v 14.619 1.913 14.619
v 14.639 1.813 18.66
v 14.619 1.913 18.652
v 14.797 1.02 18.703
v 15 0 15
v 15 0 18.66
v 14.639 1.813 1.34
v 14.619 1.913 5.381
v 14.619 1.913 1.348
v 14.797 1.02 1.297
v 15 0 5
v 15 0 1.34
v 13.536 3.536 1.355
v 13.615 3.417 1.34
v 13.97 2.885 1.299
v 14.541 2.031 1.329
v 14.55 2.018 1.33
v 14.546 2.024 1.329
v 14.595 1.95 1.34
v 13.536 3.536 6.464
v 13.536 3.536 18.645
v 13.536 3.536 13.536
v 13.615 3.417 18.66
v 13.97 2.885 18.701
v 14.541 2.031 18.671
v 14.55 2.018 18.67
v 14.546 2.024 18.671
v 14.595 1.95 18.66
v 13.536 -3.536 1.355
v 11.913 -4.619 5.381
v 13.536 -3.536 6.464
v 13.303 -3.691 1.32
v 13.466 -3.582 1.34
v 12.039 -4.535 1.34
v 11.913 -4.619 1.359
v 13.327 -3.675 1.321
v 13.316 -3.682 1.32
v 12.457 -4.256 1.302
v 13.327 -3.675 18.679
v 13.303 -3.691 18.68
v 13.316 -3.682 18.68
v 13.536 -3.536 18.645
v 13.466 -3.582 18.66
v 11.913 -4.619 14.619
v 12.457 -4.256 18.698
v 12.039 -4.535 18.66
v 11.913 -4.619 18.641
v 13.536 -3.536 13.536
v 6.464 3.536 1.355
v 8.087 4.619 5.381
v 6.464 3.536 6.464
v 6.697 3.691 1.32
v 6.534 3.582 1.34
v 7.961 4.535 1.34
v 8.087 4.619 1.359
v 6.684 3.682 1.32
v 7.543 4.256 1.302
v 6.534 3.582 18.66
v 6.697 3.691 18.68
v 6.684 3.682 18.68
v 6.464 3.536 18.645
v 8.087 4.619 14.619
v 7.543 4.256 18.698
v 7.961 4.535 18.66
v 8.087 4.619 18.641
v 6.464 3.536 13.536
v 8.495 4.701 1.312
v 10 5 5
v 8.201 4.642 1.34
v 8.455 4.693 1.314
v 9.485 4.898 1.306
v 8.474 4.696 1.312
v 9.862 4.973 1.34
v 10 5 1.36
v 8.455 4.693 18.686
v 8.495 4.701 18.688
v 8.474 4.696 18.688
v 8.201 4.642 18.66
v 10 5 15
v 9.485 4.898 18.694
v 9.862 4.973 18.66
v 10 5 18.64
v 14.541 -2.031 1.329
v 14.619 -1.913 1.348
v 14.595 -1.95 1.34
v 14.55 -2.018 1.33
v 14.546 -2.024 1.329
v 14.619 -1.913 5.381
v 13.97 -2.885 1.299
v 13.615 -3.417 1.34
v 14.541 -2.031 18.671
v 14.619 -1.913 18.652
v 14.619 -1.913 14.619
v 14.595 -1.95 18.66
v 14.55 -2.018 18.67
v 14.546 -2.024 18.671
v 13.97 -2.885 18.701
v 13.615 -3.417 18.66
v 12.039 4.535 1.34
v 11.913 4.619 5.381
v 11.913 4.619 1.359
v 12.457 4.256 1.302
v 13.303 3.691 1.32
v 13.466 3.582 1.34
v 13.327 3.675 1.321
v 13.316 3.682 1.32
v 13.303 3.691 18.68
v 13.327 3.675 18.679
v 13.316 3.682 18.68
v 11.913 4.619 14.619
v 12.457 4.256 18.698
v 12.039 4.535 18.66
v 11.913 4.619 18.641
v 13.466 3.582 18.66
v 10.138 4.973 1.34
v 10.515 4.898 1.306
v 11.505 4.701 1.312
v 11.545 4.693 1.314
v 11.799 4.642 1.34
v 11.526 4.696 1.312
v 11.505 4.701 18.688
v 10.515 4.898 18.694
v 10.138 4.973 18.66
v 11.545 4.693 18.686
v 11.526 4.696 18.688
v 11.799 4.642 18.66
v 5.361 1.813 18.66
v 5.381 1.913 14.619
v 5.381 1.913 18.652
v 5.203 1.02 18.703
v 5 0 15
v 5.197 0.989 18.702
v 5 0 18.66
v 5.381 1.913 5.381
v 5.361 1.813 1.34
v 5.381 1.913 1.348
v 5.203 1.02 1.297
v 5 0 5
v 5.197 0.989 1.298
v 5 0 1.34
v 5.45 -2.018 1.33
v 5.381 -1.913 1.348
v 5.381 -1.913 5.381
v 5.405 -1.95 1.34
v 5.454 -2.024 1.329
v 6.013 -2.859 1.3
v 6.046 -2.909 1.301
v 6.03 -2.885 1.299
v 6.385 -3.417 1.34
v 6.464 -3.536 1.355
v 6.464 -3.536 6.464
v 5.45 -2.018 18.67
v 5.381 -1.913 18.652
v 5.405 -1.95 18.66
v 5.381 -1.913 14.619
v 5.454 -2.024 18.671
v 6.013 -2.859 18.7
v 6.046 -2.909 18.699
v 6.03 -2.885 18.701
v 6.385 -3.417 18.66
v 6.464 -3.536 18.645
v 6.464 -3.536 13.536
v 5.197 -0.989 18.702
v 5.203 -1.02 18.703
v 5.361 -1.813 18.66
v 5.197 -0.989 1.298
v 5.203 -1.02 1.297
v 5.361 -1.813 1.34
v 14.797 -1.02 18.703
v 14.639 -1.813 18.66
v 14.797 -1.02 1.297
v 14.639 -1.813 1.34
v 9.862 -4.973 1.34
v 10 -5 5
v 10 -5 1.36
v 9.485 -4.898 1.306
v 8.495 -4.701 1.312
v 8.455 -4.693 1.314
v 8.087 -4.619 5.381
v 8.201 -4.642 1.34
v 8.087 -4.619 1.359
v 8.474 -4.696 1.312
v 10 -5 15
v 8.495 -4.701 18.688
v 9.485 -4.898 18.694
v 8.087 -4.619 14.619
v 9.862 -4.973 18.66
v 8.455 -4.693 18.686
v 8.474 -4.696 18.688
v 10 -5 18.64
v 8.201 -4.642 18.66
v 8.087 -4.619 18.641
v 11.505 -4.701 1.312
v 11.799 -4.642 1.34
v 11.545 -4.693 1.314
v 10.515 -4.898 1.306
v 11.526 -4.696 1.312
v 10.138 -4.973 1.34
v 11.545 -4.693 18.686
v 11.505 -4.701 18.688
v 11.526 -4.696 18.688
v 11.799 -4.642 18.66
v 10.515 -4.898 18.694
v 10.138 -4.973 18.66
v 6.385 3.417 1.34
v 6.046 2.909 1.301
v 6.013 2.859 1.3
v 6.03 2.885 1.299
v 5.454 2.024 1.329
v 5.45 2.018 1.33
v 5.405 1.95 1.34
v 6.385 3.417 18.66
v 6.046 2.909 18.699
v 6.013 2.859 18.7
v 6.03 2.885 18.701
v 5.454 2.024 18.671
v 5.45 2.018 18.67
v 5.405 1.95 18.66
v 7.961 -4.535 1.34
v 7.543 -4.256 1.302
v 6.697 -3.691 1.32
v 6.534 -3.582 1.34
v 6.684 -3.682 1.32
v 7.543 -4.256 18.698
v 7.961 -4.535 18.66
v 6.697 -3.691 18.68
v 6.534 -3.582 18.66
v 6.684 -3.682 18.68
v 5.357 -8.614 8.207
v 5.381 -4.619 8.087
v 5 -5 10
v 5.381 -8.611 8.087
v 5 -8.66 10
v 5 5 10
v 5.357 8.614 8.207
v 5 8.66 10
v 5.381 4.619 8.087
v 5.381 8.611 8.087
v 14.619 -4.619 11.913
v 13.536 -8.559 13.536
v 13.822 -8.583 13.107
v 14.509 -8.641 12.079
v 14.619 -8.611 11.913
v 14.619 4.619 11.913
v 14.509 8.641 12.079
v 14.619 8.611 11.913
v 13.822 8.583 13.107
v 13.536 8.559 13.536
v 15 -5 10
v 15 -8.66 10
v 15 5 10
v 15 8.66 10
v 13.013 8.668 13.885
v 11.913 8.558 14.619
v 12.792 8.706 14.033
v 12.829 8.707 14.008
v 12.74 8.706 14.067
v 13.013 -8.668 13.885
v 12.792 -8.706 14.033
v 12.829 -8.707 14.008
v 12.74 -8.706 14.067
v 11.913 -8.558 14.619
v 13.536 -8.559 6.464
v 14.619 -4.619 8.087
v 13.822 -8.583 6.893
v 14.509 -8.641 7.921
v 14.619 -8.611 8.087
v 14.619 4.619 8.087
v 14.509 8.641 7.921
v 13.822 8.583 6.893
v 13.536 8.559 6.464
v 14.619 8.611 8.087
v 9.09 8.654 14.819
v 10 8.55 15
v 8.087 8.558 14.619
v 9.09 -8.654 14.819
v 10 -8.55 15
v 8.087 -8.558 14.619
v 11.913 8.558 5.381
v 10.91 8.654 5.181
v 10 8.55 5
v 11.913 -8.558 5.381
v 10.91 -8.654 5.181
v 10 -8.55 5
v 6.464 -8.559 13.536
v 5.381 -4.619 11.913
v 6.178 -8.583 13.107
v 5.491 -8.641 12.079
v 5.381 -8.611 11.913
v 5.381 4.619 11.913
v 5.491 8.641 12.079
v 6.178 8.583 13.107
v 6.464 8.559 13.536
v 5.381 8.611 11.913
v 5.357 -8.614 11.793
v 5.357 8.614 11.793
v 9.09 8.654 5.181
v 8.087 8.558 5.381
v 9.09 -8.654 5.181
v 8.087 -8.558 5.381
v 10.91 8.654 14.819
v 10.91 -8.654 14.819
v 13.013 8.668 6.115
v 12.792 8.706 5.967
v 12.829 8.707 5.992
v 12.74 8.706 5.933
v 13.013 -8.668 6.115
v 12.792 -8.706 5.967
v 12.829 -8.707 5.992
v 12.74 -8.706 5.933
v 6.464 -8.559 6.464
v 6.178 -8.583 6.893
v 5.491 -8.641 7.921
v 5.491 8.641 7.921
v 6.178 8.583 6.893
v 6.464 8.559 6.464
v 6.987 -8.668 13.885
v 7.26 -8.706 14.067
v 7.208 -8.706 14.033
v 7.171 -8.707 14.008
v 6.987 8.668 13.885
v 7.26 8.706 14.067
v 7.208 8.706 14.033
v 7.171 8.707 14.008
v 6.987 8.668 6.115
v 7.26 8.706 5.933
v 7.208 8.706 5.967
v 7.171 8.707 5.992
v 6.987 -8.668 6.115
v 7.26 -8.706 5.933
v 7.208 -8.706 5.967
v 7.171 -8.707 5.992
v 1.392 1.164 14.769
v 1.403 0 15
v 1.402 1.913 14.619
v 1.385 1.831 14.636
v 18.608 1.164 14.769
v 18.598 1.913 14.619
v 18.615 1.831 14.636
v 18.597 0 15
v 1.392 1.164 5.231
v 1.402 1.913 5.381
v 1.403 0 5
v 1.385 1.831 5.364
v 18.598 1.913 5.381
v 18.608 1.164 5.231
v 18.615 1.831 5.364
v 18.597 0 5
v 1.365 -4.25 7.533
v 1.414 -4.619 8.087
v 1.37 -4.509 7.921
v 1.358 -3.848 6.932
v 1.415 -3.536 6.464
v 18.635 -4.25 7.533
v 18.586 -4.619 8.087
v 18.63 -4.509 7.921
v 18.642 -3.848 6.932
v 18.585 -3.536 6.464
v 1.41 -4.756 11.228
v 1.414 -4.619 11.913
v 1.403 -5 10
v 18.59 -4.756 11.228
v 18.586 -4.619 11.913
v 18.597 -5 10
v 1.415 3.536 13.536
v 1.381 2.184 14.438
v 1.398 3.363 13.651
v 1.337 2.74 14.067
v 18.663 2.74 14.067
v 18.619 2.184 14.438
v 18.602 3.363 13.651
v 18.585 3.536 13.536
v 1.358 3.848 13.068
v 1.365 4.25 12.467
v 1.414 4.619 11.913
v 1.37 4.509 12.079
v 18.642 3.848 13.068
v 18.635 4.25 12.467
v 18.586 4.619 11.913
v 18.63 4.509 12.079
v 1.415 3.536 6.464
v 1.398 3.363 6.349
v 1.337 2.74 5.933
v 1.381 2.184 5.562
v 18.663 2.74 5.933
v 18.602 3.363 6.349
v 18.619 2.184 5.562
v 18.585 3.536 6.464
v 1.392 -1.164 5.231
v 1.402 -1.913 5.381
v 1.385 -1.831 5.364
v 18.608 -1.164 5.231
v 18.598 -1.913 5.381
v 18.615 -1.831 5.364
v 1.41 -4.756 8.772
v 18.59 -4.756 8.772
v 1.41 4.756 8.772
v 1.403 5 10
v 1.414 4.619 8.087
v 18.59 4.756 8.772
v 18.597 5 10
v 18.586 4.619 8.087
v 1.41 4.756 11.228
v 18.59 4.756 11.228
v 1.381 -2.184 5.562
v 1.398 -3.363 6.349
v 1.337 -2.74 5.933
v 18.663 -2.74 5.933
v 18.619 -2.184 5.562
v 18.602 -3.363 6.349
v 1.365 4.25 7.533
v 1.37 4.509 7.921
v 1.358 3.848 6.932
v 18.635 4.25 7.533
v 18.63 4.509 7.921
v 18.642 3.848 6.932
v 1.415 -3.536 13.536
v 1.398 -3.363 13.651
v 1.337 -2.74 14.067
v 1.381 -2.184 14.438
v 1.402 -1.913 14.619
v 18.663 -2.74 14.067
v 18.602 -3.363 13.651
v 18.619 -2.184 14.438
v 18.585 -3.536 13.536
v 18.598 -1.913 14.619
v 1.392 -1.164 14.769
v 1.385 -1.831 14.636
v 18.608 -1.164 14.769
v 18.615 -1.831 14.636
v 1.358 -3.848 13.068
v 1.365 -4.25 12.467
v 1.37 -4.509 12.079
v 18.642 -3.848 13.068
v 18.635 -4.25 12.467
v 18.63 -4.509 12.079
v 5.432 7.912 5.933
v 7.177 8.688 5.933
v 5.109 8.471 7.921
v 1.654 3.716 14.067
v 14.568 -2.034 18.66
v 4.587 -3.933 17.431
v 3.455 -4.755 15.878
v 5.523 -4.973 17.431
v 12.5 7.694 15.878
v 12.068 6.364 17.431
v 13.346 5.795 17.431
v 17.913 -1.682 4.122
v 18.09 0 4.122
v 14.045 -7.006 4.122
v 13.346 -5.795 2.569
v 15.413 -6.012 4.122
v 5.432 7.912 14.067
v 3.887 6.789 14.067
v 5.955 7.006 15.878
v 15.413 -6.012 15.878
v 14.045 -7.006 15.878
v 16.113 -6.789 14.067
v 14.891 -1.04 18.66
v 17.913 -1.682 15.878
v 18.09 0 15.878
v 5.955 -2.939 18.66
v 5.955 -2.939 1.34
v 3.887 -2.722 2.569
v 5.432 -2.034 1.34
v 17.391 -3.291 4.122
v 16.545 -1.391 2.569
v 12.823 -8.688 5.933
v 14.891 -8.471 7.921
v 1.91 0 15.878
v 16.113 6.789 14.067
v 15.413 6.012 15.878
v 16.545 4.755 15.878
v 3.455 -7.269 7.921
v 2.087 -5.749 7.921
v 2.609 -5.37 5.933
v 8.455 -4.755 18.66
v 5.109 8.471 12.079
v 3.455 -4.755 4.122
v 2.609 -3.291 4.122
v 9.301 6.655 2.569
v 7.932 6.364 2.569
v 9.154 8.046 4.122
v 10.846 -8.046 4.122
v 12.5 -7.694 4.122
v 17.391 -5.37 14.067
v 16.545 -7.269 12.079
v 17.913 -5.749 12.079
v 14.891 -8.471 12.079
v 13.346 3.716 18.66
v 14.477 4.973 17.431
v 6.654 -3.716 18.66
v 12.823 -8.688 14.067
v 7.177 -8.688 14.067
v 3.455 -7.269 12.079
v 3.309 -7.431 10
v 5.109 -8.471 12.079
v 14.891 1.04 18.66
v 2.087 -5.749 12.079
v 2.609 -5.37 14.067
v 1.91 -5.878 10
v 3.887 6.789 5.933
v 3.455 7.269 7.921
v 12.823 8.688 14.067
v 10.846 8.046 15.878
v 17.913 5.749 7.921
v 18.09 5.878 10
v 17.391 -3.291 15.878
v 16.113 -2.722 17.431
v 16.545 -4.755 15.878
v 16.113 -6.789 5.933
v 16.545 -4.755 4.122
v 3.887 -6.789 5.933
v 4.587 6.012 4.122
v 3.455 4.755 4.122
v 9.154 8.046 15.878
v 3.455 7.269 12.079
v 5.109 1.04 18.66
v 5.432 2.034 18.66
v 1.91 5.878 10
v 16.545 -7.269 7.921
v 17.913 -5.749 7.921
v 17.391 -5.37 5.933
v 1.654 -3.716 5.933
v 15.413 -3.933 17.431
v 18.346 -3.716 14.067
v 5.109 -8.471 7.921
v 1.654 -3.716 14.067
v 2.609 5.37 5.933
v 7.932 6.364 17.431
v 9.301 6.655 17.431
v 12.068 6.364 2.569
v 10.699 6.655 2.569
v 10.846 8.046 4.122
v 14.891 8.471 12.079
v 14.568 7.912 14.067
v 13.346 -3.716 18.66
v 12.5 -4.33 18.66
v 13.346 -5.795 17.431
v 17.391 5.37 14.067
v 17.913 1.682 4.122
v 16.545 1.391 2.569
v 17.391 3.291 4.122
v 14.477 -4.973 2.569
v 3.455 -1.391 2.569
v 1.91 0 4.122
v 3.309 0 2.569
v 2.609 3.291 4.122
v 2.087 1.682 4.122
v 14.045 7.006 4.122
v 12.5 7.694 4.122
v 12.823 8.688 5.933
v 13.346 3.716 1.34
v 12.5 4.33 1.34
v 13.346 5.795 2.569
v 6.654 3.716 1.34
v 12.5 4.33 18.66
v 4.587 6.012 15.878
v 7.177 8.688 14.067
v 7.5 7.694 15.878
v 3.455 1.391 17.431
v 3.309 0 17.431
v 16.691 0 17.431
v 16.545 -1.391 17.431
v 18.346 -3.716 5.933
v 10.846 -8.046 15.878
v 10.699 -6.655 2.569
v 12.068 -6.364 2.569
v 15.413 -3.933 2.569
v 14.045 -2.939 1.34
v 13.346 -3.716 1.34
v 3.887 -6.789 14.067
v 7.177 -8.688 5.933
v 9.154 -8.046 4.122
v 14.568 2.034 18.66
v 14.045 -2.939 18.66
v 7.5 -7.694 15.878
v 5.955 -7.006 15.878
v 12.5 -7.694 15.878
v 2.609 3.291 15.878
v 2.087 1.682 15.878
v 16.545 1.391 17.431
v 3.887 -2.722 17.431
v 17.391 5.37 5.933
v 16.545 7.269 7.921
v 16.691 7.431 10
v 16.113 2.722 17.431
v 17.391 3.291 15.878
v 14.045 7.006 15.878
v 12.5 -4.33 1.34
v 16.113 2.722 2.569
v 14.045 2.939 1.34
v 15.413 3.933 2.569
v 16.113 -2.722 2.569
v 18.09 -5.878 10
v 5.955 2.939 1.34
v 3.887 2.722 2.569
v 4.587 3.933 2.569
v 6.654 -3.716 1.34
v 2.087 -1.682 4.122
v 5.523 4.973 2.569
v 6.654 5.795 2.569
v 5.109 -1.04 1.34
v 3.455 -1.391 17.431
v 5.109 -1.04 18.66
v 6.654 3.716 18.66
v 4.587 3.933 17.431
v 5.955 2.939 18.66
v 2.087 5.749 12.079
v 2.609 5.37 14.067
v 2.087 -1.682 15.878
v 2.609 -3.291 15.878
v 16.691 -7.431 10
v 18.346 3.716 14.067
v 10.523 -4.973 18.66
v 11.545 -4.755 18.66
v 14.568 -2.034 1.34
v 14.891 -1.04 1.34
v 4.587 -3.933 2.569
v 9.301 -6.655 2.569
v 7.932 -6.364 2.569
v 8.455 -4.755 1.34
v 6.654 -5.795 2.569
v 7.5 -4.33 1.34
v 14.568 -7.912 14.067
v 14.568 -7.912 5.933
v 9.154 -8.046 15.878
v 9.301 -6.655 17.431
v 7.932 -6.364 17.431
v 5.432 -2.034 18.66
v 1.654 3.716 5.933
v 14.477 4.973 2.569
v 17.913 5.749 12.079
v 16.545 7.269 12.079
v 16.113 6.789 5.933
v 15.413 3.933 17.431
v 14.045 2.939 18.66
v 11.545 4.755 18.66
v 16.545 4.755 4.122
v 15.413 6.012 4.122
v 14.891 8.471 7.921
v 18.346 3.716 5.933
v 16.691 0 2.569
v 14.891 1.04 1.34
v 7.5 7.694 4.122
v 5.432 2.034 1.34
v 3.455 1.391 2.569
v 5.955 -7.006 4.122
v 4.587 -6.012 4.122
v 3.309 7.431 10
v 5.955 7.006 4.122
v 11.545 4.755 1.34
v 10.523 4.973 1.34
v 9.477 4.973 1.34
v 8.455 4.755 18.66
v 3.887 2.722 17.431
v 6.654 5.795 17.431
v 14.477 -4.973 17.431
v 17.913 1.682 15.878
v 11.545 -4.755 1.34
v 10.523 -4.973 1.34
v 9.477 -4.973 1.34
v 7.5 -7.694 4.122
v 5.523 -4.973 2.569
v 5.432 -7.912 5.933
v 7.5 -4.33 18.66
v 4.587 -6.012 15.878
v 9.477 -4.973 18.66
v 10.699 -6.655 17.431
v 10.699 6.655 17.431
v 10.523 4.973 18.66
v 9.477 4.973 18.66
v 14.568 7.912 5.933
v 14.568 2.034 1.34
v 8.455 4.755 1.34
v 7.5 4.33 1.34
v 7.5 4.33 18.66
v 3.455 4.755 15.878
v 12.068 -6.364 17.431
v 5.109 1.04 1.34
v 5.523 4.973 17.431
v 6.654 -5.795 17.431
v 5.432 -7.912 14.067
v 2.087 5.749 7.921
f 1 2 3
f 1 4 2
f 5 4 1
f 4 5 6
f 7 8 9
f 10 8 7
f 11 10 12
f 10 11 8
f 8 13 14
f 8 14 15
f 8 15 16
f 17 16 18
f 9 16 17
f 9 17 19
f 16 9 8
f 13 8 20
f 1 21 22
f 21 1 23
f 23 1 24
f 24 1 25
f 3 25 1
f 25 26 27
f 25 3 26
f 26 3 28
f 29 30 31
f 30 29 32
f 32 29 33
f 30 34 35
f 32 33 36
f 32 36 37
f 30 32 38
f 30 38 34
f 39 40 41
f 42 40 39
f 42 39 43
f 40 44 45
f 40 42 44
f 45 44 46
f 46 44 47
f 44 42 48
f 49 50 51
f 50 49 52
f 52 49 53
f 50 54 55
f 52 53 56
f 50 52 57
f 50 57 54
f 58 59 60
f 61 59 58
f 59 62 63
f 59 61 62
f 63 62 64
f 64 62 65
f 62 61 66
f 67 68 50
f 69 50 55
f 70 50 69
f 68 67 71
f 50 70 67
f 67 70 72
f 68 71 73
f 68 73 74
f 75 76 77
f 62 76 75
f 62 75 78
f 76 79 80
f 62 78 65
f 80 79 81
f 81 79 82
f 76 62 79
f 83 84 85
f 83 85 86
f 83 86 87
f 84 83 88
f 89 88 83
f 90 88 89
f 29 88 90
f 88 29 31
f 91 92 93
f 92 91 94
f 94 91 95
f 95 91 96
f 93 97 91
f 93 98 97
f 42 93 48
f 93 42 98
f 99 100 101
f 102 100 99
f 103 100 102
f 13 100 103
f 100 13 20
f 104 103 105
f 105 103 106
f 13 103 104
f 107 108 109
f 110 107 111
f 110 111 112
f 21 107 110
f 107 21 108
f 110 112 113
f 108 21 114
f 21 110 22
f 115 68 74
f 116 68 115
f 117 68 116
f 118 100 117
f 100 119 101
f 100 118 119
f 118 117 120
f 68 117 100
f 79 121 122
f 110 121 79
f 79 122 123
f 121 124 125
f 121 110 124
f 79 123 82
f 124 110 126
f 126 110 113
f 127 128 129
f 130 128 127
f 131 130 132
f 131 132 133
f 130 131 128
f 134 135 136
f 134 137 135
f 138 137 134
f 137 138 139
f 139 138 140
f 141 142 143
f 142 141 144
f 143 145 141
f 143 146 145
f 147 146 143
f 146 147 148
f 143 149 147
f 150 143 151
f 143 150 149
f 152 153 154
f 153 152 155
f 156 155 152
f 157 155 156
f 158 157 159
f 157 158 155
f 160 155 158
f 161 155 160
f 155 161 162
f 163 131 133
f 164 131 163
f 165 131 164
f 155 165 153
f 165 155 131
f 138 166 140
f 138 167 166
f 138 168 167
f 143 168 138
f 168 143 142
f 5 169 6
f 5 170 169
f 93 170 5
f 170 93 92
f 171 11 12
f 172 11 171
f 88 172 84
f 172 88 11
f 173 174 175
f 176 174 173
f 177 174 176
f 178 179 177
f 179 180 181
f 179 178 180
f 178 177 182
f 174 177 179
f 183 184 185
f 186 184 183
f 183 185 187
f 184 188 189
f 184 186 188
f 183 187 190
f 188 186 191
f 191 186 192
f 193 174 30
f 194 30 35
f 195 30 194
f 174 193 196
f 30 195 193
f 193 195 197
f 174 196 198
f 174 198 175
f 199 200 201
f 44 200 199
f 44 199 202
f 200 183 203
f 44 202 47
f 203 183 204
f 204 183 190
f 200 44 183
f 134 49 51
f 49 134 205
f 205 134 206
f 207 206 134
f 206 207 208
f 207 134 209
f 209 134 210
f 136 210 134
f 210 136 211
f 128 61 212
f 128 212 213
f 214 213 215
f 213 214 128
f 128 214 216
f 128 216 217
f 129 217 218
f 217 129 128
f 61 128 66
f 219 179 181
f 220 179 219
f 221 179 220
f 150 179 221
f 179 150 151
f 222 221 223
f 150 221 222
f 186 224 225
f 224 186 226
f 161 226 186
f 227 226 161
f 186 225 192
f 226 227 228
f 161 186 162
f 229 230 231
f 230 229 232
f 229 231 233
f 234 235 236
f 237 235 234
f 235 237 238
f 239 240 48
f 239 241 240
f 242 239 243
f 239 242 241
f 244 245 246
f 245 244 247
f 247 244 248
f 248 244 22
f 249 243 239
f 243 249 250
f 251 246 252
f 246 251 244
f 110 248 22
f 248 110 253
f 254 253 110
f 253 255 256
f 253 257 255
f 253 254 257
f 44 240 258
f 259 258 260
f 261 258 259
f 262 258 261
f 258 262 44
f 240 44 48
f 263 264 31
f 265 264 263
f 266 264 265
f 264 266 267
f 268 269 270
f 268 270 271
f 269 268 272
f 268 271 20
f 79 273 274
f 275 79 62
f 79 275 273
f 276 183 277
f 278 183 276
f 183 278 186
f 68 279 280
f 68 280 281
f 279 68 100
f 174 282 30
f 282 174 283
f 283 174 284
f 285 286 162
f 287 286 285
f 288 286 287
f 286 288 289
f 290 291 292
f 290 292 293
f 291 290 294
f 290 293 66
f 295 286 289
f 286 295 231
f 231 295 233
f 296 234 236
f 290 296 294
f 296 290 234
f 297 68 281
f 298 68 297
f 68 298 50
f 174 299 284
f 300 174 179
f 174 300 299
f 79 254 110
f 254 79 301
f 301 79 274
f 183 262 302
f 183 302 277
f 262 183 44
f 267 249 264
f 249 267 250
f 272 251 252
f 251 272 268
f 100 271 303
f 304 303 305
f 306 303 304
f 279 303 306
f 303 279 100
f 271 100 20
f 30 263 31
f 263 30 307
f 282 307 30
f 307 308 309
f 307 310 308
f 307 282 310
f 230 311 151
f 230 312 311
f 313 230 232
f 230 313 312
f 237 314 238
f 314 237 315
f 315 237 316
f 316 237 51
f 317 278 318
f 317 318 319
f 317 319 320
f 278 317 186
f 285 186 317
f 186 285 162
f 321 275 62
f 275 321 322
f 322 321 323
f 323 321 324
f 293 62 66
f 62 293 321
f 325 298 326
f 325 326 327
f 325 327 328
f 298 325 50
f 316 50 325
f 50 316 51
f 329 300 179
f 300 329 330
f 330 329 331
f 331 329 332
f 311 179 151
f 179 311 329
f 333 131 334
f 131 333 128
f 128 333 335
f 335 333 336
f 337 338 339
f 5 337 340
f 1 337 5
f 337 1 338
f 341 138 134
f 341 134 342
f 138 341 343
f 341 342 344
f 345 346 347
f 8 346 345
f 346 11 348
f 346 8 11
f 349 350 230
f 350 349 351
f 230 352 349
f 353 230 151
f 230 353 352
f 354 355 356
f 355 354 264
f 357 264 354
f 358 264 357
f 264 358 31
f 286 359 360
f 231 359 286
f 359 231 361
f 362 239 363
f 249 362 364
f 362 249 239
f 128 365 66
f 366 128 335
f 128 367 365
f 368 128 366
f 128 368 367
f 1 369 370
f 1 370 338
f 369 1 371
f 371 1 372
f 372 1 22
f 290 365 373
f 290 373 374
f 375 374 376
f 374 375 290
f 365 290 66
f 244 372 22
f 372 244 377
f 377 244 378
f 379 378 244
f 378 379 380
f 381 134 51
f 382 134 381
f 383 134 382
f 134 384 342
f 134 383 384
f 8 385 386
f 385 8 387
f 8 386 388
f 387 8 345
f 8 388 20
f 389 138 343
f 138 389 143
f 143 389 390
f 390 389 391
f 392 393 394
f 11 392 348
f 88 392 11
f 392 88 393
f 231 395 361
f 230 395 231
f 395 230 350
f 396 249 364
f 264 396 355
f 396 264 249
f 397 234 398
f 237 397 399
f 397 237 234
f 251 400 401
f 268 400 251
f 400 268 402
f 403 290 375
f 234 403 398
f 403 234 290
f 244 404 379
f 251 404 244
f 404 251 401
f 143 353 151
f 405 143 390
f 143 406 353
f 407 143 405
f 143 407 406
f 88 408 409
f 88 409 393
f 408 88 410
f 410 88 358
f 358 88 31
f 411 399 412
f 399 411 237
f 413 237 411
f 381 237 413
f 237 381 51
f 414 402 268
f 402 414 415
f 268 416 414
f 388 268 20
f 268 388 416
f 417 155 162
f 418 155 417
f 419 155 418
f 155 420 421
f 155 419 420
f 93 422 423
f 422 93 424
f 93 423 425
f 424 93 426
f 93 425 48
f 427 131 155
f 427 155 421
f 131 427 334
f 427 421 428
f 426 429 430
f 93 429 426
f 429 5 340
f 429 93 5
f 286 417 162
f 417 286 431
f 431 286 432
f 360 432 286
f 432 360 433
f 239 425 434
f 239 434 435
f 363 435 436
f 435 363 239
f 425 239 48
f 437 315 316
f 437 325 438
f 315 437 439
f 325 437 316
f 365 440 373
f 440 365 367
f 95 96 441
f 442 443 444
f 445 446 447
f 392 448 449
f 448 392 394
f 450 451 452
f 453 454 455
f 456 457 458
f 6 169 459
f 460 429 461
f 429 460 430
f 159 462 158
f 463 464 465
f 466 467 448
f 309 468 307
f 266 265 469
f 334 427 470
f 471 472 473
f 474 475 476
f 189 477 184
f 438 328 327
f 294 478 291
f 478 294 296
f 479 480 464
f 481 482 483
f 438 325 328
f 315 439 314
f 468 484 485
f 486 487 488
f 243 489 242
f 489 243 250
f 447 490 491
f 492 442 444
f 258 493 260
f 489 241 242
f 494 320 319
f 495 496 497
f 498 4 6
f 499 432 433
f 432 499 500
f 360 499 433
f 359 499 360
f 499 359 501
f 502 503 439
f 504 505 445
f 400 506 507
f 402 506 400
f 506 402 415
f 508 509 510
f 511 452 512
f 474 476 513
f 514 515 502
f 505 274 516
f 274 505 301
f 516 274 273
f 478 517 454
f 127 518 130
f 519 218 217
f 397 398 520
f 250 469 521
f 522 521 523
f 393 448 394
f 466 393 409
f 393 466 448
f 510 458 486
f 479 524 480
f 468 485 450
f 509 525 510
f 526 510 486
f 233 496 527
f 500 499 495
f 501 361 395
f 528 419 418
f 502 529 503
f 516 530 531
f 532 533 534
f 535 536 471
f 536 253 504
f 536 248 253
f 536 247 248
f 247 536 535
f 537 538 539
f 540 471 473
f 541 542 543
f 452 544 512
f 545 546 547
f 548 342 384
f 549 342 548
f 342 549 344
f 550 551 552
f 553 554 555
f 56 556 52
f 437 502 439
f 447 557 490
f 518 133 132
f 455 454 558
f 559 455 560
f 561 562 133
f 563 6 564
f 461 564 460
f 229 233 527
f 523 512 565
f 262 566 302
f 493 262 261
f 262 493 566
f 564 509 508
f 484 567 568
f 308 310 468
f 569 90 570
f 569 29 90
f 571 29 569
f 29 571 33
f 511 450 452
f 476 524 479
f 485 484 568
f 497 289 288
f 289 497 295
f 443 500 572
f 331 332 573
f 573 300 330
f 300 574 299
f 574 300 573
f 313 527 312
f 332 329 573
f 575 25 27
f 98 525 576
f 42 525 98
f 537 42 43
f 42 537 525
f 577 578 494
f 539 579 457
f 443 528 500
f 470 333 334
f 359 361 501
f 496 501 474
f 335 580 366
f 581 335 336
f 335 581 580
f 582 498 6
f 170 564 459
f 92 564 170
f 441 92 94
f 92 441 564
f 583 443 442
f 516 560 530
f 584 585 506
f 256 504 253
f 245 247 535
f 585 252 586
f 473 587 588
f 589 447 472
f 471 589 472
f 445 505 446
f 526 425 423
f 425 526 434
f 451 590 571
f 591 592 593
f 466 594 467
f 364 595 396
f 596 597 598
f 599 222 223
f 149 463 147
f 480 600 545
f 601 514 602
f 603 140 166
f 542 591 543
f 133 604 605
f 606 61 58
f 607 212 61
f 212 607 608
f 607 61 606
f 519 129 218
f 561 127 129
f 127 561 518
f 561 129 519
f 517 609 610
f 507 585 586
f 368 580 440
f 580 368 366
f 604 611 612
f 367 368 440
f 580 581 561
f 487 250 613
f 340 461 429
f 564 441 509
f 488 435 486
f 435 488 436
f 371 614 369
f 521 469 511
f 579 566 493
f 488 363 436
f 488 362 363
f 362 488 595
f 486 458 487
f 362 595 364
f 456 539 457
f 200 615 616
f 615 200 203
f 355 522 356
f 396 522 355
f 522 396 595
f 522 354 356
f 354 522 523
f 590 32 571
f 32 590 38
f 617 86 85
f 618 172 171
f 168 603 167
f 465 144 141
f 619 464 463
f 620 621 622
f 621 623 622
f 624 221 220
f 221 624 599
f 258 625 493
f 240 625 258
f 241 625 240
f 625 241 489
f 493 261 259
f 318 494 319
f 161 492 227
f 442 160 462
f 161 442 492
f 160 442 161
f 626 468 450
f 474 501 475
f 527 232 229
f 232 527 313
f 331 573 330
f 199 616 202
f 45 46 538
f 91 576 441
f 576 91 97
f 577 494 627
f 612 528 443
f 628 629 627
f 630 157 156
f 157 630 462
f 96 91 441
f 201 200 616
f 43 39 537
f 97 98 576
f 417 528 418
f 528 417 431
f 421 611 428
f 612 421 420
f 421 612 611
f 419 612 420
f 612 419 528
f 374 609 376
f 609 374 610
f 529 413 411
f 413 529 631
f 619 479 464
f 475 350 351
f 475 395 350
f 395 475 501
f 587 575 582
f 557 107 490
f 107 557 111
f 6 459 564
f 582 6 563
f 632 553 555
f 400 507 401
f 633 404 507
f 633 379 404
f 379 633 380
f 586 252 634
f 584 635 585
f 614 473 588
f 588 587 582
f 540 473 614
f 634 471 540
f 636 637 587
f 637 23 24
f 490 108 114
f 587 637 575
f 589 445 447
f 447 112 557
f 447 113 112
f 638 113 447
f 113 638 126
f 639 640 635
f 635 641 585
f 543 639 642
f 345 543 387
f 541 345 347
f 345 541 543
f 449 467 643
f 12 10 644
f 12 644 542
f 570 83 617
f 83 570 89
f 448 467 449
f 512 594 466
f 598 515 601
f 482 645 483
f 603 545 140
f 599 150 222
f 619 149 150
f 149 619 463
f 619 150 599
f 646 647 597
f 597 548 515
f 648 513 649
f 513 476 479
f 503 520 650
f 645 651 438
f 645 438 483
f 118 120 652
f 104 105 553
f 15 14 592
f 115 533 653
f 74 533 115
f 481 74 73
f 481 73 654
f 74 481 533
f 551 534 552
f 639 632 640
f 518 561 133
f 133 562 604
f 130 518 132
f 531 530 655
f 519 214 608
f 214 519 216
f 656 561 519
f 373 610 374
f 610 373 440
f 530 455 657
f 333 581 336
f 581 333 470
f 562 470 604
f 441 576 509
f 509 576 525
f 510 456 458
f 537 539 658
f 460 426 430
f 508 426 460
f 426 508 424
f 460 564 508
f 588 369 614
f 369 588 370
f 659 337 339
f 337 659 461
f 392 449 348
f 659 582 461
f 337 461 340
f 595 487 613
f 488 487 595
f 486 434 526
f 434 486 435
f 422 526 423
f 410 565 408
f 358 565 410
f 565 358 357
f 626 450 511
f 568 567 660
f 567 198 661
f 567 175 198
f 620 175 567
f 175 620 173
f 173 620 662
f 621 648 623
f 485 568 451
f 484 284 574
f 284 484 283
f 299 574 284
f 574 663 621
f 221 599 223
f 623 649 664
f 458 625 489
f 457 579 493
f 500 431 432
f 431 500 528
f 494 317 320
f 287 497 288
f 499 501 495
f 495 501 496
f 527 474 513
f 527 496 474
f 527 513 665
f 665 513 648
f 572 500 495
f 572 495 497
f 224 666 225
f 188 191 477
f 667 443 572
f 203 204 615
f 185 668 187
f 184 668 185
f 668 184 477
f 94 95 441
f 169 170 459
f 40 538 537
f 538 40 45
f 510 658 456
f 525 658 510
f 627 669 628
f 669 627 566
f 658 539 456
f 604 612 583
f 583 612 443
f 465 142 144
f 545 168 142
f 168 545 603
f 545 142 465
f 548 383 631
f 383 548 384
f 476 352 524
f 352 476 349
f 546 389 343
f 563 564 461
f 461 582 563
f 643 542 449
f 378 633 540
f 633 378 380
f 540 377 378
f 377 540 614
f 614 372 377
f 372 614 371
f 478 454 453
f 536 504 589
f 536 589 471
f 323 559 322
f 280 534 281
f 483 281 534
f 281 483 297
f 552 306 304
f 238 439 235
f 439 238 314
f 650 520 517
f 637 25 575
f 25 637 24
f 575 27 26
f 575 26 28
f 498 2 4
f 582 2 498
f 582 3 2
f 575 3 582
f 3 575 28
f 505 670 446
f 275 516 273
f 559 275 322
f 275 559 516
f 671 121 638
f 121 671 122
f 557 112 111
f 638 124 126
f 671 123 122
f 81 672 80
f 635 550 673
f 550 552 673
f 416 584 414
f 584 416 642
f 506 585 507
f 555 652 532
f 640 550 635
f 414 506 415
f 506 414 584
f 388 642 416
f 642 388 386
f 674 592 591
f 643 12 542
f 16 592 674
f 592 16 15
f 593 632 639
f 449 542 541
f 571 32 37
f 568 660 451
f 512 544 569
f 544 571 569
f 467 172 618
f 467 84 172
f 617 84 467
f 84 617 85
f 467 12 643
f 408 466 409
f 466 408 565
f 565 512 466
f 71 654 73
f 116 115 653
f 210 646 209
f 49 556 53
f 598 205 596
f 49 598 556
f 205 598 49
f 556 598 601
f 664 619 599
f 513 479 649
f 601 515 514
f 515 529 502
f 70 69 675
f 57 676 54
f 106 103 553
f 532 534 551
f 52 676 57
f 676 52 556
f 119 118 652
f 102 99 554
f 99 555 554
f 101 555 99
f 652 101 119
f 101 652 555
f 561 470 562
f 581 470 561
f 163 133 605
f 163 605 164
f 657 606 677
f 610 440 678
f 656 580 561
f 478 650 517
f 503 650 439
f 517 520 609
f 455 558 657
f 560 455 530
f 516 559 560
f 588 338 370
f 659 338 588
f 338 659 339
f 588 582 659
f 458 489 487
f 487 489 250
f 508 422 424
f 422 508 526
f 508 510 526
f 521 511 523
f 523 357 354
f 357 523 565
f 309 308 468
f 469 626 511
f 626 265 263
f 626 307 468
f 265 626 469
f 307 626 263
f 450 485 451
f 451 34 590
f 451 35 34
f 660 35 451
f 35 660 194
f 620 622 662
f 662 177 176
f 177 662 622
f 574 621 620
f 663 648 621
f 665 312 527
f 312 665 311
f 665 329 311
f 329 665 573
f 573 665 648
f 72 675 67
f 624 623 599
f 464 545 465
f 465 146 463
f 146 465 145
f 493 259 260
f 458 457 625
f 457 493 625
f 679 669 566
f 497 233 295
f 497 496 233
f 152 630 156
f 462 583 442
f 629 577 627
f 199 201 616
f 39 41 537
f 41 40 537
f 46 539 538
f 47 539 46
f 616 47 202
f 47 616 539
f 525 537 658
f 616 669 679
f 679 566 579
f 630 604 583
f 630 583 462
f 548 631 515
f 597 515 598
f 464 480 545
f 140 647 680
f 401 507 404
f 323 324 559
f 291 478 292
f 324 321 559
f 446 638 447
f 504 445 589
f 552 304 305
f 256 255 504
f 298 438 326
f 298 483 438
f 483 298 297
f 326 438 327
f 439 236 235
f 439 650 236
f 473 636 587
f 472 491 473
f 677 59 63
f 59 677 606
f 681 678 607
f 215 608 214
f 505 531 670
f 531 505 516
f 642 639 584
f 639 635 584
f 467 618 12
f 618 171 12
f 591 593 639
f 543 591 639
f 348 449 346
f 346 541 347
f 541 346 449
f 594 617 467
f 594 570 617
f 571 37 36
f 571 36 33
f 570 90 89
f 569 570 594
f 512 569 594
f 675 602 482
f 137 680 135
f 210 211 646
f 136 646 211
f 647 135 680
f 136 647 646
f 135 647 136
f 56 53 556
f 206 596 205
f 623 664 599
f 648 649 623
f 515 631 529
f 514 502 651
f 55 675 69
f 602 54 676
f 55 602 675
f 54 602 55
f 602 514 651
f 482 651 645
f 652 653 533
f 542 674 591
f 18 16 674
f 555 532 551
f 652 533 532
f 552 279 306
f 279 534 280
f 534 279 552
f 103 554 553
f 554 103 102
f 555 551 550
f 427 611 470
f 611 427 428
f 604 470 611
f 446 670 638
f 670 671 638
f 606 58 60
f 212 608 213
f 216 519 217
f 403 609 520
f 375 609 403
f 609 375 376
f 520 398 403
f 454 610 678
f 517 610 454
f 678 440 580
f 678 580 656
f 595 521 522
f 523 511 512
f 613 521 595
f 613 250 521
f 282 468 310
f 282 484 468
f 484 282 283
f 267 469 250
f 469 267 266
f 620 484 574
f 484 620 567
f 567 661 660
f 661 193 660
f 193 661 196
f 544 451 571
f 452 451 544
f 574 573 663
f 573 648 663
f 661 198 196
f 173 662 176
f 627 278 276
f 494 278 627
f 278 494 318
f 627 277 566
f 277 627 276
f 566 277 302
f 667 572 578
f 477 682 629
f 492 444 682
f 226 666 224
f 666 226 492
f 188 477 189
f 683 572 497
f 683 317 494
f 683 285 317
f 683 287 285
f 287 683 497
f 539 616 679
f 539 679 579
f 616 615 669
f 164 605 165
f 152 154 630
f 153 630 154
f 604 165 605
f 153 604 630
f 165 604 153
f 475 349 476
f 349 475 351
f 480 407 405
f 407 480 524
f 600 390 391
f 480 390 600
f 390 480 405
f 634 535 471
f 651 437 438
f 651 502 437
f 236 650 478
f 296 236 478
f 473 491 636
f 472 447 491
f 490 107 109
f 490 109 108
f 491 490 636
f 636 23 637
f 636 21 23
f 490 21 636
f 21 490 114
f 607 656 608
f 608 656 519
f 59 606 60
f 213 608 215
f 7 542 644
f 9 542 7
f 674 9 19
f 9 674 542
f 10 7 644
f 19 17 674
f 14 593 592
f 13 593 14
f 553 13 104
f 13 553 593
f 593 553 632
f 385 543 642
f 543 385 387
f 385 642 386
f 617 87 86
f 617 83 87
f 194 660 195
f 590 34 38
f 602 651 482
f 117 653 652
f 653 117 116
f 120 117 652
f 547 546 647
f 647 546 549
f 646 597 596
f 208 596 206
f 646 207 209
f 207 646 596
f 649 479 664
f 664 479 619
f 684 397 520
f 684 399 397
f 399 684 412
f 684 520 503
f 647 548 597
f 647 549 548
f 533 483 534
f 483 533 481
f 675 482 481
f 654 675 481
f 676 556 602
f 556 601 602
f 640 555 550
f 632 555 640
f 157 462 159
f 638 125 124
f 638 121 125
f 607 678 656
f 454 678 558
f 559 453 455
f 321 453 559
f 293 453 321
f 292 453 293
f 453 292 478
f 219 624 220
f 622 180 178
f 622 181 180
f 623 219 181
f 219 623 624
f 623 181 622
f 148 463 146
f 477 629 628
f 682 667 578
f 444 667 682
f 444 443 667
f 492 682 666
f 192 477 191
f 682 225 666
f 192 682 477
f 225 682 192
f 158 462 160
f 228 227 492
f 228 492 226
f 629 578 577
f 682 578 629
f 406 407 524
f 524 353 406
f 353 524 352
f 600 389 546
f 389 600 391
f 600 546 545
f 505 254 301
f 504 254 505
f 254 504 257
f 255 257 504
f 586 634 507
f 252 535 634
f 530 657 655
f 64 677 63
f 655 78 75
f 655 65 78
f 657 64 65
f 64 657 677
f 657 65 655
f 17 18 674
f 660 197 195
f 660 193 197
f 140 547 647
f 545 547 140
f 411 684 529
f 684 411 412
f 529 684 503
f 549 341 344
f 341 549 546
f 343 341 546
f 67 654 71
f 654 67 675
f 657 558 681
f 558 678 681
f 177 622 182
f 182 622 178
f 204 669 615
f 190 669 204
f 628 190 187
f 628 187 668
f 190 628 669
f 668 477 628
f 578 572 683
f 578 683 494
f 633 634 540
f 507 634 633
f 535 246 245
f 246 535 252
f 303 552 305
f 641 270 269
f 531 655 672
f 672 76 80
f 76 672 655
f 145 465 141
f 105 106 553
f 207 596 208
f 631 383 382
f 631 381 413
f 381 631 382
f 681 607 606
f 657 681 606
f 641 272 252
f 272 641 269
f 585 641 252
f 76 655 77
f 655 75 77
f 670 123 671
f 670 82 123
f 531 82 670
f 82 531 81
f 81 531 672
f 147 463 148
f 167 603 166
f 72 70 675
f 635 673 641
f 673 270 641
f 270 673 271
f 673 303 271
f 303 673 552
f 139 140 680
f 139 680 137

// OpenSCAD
// [FL_INDEX: keywords="openscad, 3d_parametric, Holesphere, csg_solid" | COT="Parametric OpenSCAD design from 3DCodeverse"]
// Title: Holesphere

// Radius of big sphere
sphere_radius = 10; // [2:100]

// Radius of the holes in the sphere
hole_radius = 5; // [1:100]

difference(){
 translate([sphere_radius,0,sphere_radius])
  sphere(sphere_radius);
 union(){
  translate([sphere_radius,0,0]) 
   cylinder(2*sphere_radius,hole_radius,hole_radius);
  translate([sphere_radius,sphere_radius,sphere_radius]) rotate([90,0,0]) 
   cylinder(2*sphere_radius,hole_radius,hole_radius);
  translate([0,0,sphere_radius]) rotate([0,90,0]) 
   cylinder(2*sphere_radius,hole_radius,hole_radius);
 }
}
